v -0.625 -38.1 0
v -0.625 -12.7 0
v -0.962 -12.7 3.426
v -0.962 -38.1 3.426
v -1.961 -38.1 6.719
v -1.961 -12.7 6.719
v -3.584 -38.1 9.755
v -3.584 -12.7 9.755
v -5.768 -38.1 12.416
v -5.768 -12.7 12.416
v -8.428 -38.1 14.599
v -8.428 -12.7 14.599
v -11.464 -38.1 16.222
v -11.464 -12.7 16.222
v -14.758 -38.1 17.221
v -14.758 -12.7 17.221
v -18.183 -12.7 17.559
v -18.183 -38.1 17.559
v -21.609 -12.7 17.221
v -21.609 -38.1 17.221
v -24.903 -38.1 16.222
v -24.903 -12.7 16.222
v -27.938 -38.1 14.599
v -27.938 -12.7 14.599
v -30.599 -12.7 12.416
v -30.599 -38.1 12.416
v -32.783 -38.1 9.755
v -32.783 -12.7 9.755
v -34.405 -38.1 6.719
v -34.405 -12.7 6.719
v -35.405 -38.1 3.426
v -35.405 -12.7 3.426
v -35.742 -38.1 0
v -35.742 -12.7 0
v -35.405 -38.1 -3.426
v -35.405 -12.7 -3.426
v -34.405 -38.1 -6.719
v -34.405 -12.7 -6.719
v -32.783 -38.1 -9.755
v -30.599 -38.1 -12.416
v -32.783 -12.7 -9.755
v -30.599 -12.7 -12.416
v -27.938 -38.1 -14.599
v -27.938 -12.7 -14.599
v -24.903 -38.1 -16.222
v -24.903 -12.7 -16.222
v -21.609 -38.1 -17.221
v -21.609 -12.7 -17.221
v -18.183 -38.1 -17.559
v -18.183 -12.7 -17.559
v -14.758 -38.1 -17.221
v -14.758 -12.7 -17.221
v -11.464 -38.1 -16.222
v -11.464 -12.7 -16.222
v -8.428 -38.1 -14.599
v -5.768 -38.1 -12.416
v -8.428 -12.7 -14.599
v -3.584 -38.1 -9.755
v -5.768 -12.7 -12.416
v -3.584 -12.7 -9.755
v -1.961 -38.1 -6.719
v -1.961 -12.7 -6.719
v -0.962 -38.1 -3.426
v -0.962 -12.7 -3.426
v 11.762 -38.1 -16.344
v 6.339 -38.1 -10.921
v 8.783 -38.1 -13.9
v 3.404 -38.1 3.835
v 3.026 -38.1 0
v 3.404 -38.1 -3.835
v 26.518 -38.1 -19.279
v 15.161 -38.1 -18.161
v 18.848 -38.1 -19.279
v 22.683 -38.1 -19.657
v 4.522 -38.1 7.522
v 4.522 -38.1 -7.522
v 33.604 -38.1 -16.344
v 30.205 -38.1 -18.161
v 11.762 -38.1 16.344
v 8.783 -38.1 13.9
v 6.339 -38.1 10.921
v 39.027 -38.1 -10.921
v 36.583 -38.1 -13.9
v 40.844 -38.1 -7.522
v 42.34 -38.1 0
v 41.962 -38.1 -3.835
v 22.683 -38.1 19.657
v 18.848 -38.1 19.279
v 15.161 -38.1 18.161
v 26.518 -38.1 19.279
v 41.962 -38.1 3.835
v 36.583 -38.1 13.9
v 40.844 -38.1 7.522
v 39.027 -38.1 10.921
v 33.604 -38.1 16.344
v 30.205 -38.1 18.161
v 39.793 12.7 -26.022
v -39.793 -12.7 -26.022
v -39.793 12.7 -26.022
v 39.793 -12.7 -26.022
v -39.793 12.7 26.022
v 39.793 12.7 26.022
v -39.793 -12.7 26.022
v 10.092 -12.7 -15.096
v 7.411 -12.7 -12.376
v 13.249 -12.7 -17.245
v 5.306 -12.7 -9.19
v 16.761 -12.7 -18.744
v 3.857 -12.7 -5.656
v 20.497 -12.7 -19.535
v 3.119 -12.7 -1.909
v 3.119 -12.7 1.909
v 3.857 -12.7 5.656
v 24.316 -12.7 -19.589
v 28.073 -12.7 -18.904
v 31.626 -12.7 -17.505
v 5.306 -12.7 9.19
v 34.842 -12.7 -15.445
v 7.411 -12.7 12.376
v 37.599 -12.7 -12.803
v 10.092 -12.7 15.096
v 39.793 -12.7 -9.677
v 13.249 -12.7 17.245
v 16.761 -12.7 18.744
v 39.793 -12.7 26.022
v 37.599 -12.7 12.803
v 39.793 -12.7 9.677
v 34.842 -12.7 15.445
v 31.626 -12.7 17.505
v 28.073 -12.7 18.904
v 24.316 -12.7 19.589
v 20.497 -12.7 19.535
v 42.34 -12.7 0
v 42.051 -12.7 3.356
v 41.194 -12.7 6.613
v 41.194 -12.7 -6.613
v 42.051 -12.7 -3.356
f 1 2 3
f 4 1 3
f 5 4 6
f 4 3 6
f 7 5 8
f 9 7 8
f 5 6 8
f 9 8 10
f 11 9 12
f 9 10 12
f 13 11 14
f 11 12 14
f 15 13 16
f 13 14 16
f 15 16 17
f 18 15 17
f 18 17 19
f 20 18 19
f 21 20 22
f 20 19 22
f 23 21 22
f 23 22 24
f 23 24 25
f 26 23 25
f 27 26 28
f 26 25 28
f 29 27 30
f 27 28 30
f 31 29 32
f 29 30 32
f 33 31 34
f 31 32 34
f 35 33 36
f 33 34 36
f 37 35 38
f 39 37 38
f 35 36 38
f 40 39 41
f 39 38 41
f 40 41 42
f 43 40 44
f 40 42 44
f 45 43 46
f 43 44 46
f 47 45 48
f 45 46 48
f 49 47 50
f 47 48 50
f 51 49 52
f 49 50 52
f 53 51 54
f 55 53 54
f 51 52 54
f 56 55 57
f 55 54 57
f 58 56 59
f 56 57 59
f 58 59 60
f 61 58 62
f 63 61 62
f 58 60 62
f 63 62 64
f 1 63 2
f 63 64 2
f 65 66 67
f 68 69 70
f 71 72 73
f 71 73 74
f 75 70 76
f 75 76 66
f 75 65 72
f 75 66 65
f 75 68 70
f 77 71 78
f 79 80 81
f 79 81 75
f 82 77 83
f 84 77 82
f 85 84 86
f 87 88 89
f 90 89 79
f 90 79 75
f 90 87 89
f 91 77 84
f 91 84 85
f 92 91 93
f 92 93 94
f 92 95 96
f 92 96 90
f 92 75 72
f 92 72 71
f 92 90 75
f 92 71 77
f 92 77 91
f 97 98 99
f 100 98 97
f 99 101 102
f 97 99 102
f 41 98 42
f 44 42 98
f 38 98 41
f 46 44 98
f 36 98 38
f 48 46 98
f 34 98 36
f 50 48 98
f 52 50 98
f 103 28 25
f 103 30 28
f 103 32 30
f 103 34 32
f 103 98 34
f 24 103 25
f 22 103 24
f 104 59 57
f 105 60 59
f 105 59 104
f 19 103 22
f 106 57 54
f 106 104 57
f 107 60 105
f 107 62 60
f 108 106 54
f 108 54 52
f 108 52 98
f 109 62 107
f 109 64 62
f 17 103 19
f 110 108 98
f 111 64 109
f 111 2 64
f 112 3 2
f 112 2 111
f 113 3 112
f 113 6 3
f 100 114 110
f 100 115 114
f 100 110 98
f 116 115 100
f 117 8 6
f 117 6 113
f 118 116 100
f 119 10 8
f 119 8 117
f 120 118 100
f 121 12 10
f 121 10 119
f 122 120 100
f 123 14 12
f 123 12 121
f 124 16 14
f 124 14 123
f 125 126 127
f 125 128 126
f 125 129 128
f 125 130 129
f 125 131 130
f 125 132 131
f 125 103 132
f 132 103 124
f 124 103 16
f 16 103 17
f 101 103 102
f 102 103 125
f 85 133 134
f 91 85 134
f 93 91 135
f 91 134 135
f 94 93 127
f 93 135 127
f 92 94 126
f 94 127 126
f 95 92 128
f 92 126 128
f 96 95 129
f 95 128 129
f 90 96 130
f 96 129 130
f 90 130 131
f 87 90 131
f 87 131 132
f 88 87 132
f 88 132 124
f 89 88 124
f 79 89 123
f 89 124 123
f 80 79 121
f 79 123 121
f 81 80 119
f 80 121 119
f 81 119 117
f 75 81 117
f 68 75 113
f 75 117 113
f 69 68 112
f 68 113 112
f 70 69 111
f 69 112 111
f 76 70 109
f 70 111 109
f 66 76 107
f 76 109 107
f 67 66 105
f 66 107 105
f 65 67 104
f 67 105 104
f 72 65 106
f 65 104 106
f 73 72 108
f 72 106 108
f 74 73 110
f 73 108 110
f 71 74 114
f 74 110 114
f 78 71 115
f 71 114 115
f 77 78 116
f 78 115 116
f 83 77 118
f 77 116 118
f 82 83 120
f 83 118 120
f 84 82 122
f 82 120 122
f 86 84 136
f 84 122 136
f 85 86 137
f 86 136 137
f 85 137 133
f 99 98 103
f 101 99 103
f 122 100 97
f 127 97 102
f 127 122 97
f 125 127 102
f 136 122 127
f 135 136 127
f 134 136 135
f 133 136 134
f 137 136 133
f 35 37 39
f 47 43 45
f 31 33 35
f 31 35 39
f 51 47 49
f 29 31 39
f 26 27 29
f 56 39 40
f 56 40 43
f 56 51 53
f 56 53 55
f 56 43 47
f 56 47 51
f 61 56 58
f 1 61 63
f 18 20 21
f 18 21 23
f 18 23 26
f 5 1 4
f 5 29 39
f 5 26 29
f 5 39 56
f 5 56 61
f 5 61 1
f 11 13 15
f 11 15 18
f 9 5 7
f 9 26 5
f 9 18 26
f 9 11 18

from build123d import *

# Parameters (mm, degrees)
F0_W     = 79.5864835382
F0_H     = 52.0435199142
F1_DEPTH = 12.7
F2_R     = 19.6570457416
F2_R_2   = 17.5585400789
F3_DEPTH = 25.4


with BuildPart() as f1:
    # F0 (on Front) → F1 (new body, symmetric)
    with BuildSketch(Plane.XZ):
        Rectangle(F0_W, F0_H)
    extrude(amount=F1_DEPTH, both=True)

    # F2 (on face) → F3 (join)
    with BuildSketch(Plane.XZ.offset(12.7)):
        with Locations((22.6829834282, 0)):
            Circle(F2_R)
        with Locations((-18.1834697723, 0)):
            Circle(F2_R_2)
    extrude(amount=F3_DEPTH)


solid = f1.part
